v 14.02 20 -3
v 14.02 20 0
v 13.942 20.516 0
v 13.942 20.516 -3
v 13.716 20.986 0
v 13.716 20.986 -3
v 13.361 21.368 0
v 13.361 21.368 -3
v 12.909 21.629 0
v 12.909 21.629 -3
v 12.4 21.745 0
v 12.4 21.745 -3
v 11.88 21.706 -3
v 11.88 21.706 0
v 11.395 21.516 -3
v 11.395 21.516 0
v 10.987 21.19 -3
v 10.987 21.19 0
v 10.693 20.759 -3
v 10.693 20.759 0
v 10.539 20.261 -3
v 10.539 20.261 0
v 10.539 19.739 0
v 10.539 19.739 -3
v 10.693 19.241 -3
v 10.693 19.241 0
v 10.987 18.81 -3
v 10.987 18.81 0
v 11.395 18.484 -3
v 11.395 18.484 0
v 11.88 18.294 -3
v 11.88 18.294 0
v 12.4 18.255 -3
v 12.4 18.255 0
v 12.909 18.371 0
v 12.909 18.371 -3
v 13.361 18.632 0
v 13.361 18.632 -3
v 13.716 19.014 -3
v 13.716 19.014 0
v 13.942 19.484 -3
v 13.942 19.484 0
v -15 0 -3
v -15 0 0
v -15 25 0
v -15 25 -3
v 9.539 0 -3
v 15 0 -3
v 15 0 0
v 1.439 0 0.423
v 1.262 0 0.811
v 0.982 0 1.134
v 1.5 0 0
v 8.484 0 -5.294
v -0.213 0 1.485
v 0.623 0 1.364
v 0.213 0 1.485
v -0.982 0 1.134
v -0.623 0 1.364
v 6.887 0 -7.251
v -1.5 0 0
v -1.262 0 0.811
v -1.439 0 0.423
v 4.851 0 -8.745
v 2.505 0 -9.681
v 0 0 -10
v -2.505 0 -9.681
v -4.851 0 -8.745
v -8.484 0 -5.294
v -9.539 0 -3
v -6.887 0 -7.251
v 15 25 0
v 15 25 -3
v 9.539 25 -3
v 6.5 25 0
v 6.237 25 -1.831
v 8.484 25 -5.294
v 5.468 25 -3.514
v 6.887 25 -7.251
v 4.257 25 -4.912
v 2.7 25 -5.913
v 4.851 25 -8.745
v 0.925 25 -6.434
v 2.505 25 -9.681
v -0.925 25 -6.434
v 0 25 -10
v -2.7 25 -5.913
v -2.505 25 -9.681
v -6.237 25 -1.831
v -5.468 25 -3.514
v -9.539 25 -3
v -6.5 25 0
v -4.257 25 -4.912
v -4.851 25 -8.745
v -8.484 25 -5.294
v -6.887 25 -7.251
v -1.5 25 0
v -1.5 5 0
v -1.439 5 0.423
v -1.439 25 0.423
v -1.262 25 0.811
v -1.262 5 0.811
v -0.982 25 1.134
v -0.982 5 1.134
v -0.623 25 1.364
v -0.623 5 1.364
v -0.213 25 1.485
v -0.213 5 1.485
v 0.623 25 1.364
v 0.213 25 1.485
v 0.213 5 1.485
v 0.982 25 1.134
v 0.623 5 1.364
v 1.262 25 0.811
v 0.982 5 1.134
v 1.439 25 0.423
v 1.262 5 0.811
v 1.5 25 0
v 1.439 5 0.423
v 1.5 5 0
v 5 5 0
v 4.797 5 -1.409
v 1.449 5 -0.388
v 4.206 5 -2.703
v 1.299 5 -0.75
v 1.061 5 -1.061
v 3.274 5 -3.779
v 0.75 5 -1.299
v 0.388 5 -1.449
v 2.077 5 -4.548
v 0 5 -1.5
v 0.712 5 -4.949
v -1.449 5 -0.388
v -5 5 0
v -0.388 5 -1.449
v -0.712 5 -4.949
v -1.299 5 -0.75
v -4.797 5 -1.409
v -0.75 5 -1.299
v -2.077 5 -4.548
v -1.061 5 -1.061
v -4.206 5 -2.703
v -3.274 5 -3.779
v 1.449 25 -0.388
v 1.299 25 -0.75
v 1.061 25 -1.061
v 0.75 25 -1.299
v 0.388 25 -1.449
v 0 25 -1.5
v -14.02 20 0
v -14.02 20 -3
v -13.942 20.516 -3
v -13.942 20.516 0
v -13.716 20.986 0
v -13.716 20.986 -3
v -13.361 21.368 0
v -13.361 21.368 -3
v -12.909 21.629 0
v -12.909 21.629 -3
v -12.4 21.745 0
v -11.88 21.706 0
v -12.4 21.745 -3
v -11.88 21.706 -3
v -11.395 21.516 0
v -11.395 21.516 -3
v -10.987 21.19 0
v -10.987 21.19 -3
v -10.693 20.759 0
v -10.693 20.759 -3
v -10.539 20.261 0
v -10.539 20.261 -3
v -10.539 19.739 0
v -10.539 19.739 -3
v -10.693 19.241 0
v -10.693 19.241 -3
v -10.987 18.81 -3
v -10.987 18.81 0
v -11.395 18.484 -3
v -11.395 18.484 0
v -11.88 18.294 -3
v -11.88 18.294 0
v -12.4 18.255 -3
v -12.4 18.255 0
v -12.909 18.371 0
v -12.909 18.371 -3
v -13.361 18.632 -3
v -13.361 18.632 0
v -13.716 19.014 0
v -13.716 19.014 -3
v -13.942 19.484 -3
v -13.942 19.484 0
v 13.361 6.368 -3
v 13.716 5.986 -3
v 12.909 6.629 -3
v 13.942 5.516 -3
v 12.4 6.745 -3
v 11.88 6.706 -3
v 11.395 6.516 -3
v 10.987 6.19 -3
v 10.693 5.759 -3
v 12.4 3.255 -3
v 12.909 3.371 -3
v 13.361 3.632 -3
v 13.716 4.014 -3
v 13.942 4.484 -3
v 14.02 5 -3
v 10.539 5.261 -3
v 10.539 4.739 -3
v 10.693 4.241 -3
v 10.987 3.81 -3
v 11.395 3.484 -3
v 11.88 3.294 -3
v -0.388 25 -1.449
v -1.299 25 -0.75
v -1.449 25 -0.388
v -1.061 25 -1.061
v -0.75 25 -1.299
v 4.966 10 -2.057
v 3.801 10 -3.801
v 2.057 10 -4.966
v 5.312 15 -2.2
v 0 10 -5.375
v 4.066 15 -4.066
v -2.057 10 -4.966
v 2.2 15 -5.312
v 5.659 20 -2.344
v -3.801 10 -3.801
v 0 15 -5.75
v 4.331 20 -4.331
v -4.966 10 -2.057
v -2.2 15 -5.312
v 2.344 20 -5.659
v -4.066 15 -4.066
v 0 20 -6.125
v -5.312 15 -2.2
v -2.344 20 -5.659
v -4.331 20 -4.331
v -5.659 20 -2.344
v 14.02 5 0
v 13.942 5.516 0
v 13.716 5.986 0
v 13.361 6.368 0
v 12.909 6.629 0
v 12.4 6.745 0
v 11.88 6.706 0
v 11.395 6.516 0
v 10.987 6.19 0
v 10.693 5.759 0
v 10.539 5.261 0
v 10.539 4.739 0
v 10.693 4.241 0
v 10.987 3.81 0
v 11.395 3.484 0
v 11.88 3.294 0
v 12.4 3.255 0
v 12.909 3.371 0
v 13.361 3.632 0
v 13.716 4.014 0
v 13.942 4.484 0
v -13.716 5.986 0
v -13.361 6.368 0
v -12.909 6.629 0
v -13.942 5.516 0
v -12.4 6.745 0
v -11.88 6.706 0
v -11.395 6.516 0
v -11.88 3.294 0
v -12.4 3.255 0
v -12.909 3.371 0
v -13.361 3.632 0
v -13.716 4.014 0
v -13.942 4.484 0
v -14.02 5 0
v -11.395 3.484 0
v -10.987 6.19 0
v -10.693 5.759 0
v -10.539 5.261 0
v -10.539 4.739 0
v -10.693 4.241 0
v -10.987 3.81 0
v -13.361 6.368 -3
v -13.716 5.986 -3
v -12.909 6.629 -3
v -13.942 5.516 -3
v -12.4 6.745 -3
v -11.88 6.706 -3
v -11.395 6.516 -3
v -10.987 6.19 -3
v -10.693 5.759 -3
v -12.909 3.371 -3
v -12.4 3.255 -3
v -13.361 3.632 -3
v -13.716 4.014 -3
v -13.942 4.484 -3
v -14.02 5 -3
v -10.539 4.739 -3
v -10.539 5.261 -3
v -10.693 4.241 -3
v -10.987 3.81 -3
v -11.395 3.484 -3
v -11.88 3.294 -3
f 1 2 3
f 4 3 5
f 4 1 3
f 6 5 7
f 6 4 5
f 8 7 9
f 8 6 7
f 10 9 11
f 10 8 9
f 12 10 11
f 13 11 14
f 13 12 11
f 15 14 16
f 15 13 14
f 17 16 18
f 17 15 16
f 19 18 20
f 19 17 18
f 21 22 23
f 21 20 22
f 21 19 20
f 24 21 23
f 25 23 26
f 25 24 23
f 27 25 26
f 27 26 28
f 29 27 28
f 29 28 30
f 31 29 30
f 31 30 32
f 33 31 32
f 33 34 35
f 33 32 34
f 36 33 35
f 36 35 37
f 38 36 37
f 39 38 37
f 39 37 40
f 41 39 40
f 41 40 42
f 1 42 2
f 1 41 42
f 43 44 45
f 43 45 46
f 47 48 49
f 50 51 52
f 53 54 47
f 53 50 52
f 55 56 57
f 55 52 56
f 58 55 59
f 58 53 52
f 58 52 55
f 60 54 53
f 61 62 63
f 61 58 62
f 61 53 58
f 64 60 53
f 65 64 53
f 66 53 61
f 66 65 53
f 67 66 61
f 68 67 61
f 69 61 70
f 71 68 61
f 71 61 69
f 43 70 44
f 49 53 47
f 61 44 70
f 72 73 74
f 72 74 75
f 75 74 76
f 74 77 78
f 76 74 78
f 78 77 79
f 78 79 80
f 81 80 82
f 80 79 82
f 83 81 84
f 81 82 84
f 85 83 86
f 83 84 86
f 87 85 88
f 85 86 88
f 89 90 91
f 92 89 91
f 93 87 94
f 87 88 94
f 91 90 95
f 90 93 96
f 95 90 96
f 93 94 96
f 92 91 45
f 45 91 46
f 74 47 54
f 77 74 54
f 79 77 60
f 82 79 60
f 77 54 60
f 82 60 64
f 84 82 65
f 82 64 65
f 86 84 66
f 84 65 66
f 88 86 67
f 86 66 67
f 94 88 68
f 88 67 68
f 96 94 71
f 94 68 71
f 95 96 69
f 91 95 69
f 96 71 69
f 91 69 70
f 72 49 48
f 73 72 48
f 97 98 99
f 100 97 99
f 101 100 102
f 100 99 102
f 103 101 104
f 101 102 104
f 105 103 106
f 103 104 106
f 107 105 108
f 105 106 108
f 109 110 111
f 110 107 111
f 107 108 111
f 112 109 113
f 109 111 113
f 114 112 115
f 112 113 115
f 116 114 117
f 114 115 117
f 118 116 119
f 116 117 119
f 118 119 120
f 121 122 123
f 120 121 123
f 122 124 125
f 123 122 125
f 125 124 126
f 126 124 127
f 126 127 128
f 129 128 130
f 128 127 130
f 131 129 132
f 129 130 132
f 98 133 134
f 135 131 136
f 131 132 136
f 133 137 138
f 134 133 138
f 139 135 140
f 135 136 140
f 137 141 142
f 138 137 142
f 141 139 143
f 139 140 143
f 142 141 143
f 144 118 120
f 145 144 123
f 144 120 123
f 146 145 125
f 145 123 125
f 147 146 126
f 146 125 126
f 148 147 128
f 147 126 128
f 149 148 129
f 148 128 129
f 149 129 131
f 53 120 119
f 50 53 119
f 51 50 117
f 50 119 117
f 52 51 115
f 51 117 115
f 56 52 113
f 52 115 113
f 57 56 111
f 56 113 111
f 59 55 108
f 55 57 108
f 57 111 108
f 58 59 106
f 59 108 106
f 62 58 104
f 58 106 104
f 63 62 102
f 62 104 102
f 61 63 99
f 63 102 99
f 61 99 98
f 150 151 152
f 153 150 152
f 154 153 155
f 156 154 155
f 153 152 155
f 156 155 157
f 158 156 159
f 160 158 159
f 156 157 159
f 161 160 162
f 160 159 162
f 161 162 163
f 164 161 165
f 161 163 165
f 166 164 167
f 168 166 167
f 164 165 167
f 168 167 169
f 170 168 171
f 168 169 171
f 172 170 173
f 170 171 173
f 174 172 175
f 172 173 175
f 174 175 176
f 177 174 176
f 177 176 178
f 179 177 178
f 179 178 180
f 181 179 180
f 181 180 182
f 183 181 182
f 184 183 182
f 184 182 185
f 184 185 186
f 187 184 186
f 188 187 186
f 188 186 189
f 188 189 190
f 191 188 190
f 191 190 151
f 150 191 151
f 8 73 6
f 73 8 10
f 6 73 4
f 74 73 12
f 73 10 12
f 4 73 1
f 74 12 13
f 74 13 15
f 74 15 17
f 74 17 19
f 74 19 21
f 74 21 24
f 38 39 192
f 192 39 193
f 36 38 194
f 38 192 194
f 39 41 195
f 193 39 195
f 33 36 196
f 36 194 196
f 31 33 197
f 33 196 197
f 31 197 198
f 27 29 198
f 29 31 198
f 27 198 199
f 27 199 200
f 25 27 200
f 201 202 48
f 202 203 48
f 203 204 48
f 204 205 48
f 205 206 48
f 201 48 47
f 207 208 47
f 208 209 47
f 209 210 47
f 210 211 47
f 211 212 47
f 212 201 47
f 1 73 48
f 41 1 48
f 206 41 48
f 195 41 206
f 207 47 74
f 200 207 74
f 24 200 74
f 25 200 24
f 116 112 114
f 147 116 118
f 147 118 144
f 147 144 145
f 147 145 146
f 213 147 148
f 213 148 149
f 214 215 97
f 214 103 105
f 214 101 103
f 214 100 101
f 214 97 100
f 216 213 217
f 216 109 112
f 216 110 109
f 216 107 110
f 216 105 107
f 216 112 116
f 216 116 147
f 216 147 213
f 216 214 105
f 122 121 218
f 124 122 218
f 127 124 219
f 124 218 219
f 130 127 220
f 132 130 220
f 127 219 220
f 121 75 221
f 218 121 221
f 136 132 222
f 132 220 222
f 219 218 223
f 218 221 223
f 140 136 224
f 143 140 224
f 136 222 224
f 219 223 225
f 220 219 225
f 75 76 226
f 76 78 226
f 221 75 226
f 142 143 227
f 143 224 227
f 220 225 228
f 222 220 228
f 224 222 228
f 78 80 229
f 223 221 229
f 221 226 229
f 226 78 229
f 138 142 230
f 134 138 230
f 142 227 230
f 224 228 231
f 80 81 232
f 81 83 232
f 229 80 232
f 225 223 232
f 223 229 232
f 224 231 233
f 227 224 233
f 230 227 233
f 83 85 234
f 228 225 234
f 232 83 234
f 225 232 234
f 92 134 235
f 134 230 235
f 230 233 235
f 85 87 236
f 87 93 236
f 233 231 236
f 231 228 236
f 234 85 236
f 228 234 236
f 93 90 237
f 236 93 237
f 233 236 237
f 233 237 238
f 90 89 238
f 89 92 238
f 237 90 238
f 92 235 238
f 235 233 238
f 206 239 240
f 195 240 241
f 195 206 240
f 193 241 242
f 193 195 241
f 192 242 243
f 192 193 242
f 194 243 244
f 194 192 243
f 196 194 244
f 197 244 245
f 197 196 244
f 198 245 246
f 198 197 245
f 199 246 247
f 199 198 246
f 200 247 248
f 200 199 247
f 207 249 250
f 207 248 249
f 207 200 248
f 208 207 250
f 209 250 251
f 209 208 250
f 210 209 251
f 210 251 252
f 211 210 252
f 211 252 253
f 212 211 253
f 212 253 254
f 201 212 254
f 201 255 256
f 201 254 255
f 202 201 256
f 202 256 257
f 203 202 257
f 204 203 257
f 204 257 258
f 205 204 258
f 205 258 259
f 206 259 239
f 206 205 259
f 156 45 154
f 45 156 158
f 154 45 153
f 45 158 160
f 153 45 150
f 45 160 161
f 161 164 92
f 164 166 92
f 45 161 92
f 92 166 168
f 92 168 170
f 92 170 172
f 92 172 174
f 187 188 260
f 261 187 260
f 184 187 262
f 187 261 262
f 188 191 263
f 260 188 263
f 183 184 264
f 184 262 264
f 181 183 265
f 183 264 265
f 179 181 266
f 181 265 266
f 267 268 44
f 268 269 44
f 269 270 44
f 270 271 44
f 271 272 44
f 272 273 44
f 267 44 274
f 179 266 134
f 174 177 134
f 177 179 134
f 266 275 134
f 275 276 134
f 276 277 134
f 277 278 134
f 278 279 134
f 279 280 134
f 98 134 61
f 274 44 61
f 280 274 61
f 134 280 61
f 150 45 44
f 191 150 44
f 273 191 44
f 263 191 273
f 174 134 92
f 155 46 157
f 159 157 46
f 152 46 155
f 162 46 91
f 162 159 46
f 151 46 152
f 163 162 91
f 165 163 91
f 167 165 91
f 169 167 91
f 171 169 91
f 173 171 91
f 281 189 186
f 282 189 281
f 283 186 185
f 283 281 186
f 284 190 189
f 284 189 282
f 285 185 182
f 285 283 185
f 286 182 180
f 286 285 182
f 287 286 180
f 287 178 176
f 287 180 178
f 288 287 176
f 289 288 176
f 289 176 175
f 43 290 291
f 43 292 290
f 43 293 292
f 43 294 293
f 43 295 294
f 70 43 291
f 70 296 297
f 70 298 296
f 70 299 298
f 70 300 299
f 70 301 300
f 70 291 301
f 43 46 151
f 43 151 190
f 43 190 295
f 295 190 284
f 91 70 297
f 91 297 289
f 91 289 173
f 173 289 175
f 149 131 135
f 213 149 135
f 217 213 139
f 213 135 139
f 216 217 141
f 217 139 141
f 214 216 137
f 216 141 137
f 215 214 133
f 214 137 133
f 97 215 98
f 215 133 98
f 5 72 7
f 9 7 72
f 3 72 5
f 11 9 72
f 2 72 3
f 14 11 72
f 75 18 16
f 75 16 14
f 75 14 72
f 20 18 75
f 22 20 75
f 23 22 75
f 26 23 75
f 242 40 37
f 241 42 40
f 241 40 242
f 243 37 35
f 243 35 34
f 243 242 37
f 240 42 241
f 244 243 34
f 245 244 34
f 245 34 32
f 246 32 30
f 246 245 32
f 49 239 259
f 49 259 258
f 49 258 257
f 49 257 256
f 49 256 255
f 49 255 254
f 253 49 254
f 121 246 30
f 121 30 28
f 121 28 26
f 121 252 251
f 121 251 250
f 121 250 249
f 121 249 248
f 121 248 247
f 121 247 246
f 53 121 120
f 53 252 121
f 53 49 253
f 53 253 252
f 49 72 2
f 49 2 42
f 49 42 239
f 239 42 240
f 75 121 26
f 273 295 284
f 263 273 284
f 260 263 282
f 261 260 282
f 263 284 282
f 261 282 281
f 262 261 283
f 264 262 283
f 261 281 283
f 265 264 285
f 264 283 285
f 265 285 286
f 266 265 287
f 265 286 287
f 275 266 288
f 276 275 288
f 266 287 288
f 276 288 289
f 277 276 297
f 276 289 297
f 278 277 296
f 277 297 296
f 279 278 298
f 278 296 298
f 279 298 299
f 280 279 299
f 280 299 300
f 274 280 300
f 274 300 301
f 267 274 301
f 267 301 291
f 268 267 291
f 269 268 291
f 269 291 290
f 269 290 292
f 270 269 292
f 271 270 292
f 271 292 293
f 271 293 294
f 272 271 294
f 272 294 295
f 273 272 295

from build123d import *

# Parameters (mm, degrees)
SKETCH1_R           = 10
BOSS_EXTRUDE1_DEPTH = 25
SKETCH4_R           = 1.5
BOSS_EXTRUDE2_DEPTH = 20
SKETCH6_W           = 7.254775406
SKETCH6_H           = 3
BOSS_EXTRUDE3_DEPTH = 25
CUT_EXTRUDE1_DEPTH  = 31.822070015
SKETCH7_R           = 1.75
CUT_EXTRUDE2_DEPTH  = 30.983328701


# Read off the part's stored shape, not the designer's step: Boundary-Cut1
with BuildPart() as part:
    # Sketch1 → Boss-Extrude1 (new body)
    with BuildSketch(Plane(origin=(0, 0, 0), x_dir=(1, 0, 0), z_dir=(0, 1, 0))):
        with Locations(Location((0, 0, 0), (0, 0, 270))):
            Circle(SKETCH1_R)
    extrude(amount=BOSS_EXTRUDE1_DEPTH)

    # Boundary-Cut1 outline → Boundary-Cut1 (revolve, cut)
    with BuildSketch(Plane.XY):
        Polygon((0, 5), (5, 5), (6.5, 25), (0, 25), align=None)
    revolve(axis=Axis((0, 0, 0), (0, 1, 0)), mode=Mode.SUBTRACT)

    # Sketch4 → Boss-Extrude2 (add)
    with BuildSketch(Plane(origin=(0, 5, 0), x_dir=(1, 0, 0), z_dir=(0, 1, 0))):
        with Locations(Location((0, 0, 0), (0, 0, 90))):
            Circle(SKETCH4_R)
    extrude(amount=BOSS_EXTRUDE2_DEPTH)

    # Sketch6 → Boss-Extrude3 (add)
    with BuildSketch(Plane(origin=(0, 0, 0), x_dir=(1, 0, 0), z_dir=(0, 1, 0))):
        with Locations((-11.372612297, 1.5)):
            Rectangle(SKETCH6_W, SKETCH6_H)
    boss_extrude3 = extrude(amount=BOSS_EXTRUDE3_DEPTH)

    # Sketch5 → Cut-Extrude1 (cut, through all)
    with BuildSketch(Plane(origin=(0, 25, 0), x_dir=(1, 0, 0), z_dir=(0, 1, 0))):
        with BuildLine():
            Line((-1.5, 0), (-10, 0))
            ThreePointArc((-10, 0), (0, -10), (10, 0))
            Line((10, 0), (1.5, 0))
            ThreePointArc((1.5, 0), (0, -1.5), (-1.5, 0))
        make_face()
    extrude(amount=-CUT_EXTRUDE1_DEPTH, mode=Mode.SUBTRACT)

    # Sketch7 → Cut-Extrude2 (cut, through all)
    with BuildSketch(Plane(origin=(0, 0, -3), x_dir=(-1, 0, 0), z_dir=(0, 0, -1))):
        with Locations((12.269696007, 5)):
            Circle(SKETCH7_R)
        with Locations((12.269696007, 20)):
            Circle(SKETCH7_R)
    cut_extrude2 = extrude(amount=-CUT_EXTRUDE2_DEPTH, mode=Mode.SUBTRACT)

    # Mirror1: Boss-Extrude3, Cut-Extrude2 across plane
    add(boss_extrude3.mirror(Plane(origin=(0, 0, 0), x_dir=(0, 0, 1), z_dir=(1, 0, 0))))
    add(cut_extrude2.mirror(Plane(origin=(0, 0, 0), x_dir=(0, 0, 1), z_dir=(1, 0, 0))), mode=Mode.SUBTRACT)


solid = part.part
